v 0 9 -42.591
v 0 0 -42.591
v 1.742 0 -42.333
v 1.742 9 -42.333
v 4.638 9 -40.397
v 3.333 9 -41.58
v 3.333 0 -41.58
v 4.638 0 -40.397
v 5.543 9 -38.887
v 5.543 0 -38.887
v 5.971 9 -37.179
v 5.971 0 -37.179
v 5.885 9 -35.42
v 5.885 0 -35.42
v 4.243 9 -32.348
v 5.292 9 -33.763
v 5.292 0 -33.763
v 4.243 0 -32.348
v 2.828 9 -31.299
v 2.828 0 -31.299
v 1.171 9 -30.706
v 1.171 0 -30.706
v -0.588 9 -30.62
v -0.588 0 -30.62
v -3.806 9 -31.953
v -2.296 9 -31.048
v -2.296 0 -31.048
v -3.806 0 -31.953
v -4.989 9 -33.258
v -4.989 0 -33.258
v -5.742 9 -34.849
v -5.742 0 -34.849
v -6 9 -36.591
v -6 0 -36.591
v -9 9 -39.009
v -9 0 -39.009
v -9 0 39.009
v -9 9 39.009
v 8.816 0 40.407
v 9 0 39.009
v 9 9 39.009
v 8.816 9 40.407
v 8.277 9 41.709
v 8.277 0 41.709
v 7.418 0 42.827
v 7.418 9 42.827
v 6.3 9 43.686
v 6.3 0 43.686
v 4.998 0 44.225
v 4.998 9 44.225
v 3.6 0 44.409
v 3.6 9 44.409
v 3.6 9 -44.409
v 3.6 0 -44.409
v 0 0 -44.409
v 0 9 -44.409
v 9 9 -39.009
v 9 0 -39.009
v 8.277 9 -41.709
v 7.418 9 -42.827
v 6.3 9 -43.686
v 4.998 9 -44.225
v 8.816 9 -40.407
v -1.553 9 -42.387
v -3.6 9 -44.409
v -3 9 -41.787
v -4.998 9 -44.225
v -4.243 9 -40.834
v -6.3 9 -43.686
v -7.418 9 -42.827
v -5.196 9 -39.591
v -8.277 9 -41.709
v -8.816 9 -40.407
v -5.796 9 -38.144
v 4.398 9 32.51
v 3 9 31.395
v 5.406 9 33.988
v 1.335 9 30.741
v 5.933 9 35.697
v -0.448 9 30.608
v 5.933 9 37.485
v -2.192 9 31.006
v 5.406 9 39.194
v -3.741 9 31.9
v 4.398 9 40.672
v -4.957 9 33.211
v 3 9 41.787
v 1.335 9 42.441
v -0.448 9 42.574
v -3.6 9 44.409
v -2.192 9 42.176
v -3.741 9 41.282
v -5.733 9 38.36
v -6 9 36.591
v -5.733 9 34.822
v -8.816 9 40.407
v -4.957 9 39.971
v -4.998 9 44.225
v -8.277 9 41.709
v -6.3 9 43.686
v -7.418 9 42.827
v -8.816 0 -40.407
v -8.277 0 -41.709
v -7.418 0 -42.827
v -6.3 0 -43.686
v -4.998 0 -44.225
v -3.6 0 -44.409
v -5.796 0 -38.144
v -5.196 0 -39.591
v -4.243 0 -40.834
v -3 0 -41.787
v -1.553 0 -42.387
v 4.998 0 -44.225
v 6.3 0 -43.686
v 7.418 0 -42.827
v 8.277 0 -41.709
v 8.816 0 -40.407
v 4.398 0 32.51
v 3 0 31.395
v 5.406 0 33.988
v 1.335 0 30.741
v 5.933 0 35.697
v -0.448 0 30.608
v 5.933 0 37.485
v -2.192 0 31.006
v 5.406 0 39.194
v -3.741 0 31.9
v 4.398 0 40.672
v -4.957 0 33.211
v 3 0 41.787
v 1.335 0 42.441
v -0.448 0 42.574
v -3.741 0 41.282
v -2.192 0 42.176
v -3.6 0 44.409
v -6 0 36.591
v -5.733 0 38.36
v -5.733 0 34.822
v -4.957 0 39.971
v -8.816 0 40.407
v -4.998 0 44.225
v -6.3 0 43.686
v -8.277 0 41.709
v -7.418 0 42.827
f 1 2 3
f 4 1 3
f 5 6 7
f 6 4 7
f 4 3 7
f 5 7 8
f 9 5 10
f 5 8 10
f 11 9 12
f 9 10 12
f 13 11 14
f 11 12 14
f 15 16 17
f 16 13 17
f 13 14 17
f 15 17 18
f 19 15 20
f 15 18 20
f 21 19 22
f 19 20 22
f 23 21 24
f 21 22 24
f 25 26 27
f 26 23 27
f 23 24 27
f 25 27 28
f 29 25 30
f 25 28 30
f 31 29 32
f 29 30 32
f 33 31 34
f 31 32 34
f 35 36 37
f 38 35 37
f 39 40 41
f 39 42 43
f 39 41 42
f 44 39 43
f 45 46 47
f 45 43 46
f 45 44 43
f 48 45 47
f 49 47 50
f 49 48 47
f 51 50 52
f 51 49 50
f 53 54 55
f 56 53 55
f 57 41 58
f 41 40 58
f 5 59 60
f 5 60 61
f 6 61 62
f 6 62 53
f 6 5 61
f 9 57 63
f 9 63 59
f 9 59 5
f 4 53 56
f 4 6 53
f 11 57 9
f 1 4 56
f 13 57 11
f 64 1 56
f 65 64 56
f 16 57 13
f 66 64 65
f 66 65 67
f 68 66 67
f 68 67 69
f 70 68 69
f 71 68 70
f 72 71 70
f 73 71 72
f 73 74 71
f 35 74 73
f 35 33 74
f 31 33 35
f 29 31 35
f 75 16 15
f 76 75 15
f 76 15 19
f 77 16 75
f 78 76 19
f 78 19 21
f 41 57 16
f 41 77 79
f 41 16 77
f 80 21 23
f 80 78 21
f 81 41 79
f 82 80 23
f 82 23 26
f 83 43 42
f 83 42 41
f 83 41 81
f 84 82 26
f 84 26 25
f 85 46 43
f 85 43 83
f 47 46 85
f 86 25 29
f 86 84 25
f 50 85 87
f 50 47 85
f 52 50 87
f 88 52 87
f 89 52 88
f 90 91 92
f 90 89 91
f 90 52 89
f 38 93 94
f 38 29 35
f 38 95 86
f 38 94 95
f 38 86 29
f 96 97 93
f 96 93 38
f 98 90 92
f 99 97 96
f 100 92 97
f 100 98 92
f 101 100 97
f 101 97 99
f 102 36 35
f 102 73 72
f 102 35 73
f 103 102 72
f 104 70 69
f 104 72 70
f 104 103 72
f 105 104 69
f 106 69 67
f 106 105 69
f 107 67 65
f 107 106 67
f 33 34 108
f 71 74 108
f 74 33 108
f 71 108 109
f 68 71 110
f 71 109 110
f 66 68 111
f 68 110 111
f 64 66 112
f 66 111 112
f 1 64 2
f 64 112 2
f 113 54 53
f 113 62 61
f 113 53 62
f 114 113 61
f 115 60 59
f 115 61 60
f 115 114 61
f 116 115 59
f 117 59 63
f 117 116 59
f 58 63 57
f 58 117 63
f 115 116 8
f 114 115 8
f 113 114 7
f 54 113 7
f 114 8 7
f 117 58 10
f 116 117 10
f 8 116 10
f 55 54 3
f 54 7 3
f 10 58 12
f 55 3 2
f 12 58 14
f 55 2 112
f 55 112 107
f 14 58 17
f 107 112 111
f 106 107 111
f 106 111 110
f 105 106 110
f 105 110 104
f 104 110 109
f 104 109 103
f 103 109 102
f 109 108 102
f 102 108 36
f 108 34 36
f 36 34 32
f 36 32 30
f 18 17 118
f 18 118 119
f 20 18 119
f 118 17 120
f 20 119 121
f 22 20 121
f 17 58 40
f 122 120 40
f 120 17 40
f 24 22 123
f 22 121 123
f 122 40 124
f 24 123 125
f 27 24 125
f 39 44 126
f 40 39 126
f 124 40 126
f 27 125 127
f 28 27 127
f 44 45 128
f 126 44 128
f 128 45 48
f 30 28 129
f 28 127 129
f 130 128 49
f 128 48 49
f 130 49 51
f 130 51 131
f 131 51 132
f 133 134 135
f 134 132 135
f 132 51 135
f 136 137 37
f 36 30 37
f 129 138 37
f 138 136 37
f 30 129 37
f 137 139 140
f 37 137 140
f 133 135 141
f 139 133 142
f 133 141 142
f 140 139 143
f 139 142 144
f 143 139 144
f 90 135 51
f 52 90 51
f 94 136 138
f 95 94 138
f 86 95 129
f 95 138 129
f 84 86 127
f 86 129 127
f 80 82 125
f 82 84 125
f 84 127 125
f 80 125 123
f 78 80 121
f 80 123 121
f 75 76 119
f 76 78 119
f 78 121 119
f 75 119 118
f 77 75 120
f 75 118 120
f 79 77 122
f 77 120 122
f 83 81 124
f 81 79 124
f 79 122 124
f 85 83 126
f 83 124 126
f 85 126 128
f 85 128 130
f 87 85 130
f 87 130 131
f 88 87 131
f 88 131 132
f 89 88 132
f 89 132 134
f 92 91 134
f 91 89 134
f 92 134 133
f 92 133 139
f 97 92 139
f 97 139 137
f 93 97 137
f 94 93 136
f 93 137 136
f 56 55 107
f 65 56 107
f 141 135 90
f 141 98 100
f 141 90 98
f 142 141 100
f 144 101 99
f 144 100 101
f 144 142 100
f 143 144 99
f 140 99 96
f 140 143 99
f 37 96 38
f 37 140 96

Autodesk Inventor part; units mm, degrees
ref_plane "YZ Plane" through (0, 0, 0) normal (1, 0, 0) x (0, 1, 0)
ref_plane "XZ Plane" through (0, 0, 0) normal (0, 1, 0) x (-1, 0, 0)
ref_plane "XY Plane" through (0, 0, 0) normal (0, 0, 1) x (1, 0, 0)
sketch "Sketch1" plane through (0, 0, 0) normal (0, 1, 0) x (-1, 0, 0)
  line L0 (3.6, 44.409) -> (-3.6, 44.409)
  line L1 (-9, 39.009) -> (-9, -39.009)
  line L2 (-3.6, -44.409) -> (3.6, -44.409)
  line L3 (9, -39.009) -> (9, 39.009)
  line L4 (9, 44.409) -> (-9, -44.409) construction
  line L5 (-9, 44.409) -> (9, -44.409) construction
  arc A0 (3.6, -44.409) -> (9, -39.009) centre (3.6, -39.009) ccw
  arc A1 (-9, -39.009) -> (-3.6, -44.409) centre (-3.6, -39.009) ccw
  arc A2 (9, 39.009) -> (3.6, 44.409) centre (3.6, 39.009) ccw
  arc A3 (-3.6, 44.409) -> (-9, 39.009) centre (-3.6, 39.009) ccw
  line L6 (0, -44.409) -> (0, -36.591)
  circle A4 centre (0, -36.591) radius 6
  line L7 (0, 0) -> (1.5436, 0)
  circle A5 centre (0, 36.591) radius 6
  dimension "d0" = 18
  dimension "d1" = 88.818
  dimension "d2" = 5.4
  dimension "d3" = 7.818
  dimension "d4" = 12
extrude "Extrusion1" add sketch "Sketch1" along normal blind 9
properties part number "LegLverr"
